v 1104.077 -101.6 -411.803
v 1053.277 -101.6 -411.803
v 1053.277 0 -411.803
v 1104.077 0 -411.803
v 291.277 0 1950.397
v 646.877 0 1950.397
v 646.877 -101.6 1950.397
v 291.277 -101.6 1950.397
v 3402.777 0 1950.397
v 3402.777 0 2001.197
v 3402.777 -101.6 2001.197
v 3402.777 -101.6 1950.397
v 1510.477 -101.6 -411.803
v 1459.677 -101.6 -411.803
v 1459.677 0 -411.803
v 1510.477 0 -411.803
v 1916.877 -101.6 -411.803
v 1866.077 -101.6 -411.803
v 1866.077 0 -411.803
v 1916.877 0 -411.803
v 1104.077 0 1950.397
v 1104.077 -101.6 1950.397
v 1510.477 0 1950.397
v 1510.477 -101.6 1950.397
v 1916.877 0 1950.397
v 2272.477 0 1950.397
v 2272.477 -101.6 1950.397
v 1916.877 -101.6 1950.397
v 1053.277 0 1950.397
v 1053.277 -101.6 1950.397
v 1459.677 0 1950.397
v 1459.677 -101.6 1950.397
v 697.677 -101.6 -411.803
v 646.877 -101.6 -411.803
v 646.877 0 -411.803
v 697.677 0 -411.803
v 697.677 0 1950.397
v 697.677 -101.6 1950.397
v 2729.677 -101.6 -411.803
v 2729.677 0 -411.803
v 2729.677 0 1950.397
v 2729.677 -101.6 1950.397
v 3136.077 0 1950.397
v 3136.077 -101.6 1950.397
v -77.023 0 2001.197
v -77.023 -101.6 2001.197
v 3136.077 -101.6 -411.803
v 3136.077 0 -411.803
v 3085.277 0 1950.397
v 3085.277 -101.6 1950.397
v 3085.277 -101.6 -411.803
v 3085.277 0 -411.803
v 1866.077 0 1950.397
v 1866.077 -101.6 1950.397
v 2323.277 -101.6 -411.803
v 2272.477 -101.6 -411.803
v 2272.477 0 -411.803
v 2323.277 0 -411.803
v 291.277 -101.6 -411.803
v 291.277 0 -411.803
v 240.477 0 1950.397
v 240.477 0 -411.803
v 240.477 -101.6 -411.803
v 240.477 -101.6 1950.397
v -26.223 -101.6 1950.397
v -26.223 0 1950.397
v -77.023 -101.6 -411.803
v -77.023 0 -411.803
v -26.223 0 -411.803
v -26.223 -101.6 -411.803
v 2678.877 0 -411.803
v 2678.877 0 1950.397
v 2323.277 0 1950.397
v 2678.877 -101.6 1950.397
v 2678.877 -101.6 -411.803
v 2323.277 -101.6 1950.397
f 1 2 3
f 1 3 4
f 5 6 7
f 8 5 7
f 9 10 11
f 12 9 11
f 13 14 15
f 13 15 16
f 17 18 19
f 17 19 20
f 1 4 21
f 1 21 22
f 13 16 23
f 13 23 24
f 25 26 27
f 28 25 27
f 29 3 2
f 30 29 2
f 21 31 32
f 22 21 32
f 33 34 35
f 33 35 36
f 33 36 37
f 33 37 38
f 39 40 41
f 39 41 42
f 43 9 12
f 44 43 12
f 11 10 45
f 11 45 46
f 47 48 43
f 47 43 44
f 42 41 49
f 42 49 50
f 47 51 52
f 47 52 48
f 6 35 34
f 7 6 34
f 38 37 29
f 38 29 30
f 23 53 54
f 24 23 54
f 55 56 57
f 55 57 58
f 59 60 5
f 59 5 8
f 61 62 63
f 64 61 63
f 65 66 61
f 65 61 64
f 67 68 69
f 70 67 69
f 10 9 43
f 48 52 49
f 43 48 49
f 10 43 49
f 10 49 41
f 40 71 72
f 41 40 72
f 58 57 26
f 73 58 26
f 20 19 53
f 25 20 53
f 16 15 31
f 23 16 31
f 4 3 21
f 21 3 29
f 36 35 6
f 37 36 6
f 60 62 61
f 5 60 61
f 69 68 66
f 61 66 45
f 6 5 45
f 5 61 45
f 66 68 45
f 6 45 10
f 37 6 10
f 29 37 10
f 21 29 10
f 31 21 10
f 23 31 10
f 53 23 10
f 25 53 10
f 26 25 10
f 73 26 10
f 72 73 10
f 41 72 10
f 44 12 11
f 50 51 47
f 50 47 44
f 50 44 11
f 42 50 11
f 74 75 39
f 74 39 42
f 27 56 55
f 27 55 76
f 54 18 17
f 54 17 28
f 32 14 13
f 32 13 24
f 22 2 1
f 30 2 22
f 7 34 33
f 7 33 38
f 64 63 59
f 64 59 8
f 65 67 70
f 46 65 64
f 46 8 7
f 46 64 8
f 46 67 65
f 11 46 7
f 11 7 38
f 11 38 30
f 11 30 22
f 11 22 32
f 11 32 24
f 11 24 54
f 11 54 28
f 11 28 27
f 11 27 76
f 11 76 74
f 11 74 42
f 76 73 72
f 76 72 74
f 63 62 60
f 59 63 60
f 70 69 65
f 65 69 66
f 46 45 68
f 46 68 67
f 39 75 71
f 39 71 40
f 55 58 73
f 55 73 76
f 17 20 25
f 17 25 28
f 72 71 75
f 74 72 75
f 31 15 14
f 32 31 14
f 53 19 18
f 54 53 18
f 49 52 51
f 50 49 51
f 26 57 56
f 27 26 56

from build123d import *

# Parameters (mm, degrees)
F0_W     = 50.8
F0_H     = 2362.2
F1_DEPTH = 101.6
F2_W     = 101.6
F2_H     = 50.8
F3_DEPTH = 3479.8
F4_W     = 50.8
F4_H     = 101.6
F5_DEPTH = 2362.2


# Not quite as in the source:
# - a feature names something its author has since deleted; it is built from what else it names


with BuildPart() as f1:
    # F0 (on Front) → F1 (new body)
    with BuildSketch(Plane.XZ):
        with Locations((-51.6230743378, 769.2967753548)):
            Rectangle(F0_W, F0_H)
    extrude(amount=F1_DEPTH)

    # F2 (on face) → F3 (join)
    with BuildSketch(Plane(origin=(-77.0230743378, 0, 0), x_dir=(0, -1, 0), z_dir=(-1, 0, 0))):
        with Locations((50.8, 1975.7967753548)):
            Rectangle(F2_W, F2_H)
    extrude(amount=-F3_DEPTH)

    # F4 (on face) → F5 (join)
    with BuildSketch(Plane(origin=(0, 0, 1950.3967753548), x_dir=(1, 0, 0), z_dir=(0, 0, -1))):
        with Locations((265.8769256622, 50.8)):
            Rectangle(F4_W, F4_H)
        with Locations((672.2769256622, 50.8)):
            Rectangle(F4_W, F4_H)
        with Locations((1078.6769256622, 50.8)):
            Rectangle(F4_W, F4_H)
        with Locations((1485.0769256622, 50.8)):
            Rectangle(F4_W, F4_H)
        with Locations((1891.4769256622, 50.8)):
            Rectangle(F4_W, F4_H)
        with Locations((2297.8769256622, 50.8)):
            Rectangle(F4_W, F4_H)
        with Locations((2704.2769256622, 50.8)):
            Rectangle(F4_W, F4_H)
        with Locations((3110.6769256622, 50.8)):
            Rectangle(F4_W, F4_H)
    extrude(amount=F5_DEPTH)


solid = f1.part
